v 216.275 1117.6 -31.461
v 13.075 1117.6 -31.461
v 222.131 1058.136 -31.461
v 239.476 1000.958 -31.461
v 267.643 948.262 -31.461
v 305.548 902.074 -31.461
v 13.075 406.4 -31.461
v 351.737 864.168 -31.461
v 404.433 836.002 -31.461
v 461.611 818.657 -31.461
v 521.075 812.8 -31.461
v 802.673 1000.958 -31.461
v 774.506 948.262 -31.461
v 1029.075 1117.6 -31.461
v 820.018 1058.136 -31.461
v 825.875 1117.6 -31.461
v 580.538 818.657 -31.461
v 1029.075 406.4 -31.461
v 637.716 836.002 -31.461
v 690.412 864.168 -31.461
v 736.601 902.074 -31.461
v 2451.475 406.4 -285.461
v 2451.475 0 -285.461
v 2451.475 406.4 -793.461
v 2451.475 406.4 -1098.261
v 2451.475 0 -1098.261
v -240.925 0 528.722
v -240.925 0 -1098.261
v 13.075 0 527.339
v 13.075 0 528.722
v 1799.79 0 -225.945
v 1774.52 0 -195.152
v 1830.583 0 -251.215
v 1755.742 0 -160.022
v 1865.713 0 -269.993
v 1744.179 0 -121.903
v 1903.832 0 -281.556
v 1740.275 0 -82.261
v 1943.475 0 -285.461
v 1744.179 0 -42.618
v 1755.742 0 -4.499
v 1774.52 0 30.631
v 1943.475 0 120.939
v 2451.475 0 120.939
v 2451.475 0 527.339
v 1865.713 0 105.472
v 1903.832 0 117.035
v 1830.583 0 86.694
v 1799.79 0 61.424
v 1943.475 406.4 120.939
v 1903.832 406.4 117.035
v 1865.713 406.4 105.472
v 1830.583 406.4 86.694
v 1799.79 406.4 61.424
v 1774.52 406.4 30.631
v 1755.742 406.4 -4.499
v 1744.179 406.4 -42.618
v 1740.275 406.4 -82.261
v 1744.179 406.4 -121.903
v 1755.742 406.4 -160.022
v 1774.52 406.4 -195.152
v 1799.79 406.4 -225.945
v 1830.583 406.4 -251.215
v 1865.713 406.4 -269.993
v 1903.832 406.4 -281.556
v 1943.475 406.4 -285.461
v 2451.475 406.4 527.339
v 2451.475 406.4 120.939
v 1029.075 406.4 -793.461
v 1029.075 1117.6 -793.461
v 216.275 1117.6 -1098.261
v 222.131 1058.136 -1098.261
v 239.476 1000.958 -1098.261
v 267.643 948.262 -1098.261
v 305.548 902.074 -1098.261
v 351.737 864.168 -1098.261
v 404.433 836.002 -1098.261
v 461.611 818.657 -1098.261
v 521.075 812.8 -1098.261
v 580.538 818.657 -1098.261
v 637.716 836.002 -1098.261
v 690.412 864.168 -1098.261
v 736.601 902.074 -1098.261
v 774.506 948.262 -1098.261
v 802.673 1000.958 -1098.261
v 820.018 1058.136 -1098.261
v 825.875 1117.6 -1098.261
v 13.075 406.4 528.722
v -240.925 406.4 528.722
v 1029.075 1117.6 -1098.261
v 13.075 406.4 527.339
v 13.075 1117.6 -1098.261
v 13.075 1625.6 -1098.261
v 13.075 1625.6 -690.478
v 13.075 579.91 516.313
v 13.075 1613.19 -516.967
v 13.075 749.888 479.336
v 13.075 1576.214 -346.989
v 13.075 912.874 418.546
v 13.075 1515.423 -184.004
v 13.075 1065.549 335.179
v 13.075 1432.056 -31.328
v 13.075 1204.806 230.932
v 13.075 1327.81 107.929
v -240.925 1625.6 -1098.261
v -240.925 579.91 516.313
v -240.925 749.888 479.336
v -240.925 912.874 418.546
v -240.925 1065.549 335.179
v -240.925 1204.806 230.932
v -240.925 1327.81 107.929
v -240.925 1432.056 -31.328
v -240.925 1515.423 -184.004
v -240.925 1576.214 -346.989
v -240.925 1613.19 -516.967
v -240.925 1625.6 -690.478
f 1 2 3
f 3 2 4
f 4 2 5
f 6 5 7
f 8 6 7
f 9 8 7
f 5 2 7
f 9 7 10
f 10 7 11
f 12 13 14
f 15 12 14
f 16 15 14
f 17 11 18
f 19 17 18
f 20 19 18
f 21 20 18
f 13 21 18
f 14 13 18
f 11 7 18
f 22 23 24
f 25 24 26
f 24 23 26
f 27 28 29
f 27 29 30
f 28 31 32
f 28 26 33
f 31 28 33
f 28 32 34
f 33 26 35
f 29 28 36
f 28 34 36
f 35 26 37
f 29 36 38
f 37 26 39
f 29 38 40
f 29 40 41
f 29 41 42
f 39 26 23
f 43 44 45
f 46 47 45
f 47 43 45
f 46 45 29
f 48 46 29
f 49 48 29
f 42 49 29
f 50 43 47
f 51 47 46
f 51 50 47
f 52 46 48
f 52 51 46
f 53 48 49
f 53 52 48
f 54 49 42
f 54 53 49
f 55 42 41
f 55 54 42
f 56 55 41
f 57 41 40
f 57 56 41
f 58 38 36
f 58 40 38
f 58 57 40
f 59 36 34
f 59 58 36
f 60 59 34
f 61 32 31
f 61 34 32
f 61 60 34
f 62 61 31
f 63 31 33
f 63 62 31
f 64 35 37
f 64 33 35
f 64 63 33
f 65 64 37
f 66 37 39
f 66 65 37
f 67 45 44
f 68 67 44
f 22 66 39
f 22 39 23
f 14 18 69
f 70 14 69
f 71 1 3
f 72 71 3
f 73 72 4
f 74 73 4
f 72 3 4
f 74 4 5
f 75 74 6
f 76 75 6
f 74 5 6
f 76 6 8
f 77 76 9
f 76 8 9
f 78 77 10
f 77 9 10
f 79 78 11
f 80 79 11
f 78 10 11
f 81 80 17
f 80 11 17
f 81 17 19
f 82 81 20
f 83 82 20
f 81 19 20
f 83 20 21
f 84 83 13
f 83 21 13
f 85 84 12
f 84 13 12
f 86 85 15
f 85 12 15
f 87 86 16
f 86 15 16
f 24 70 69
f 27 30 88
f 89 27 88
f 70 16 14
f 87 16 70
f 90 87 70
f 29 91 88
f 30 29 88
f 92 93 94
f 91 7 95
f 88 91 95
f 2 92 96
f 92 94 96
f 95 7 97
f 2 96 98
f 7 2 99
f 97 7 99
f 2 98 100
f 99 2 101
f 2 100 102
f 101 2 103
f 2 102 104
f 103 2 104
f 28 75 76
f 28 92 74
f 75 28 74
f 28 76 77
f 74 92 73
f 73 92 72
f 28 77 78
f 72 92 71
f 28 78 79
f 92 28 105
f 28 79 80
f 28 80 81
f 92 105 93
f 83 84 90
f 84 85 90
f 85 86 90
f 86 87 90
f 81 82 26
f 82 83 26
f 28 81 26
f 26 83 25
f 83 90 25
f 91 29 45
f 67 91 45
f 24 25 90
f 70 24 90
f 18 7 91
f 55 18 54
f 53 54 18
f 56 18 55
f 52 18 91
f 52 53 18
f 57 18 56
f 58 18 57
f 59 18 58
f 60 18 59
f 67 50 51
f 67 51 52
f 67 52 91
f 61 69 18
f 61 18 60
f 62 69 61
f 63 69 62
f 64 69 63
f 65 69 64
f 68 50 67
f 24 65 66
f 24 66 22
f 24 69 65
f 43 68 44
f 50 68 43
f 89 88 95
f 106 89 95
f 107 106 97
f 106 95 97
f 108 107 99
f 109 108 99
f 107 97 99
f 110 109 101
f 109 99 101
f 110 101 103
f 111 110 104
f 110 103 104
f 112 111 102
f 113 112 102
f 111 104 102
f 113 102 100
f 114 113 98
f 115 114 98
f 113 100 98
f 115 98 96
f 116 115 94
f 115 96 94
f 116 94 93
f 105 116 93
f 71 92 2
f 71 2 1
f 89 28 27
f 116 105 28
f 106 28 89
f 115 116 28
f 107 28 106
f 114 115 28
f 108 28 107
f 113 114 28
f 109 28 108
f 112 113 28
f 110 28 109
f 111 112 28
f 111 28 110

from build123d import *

# Parameters (mm, degrees)
SKETCH2_W           = 2438.4
SKETCH2_H           = 1625.6
BOSS_EXTRUDE1_DEPTH = 406.4
CUT_EXTRUDE1_DEPTH  = 2717.81148747
BOSS_EXTRUDE3_DEPTH = 254
SKETCH8_W           = 1016
SKETCH8_H           = 1066.8
BOSS_EXTRUDE4_DEPTH = 711.2
SKETCH9_R           = 304.8
CUT_EXTRUDE3_DEPTH  = 3129.955892197
BOSS_EXTRUDE6_DEPTH = 304.8


with BuildPart() as part:
    # Sketch2 → Boss-Extrude1 (new body)
    with BuildSketch(Plane(origin=(0, 0, 0), x_dir=(1, 0, 0), z_dir=(0, 1, 0))):
        with Locations((1232.274530831, 285.460589812)):
            Rectangle(SKETCH2_W, SKETCH2_H)
    extrude(amount=BOSS_EXTRUDE1_DEPTH)

    # Sketch4 → Cut-Extrude1 (cut, through all)
    with BuildSketch(Plane(origin=(0, 406.4, 0), x_dir=(1, 0, 0), z_dir=(0, 1, 0))):
        with BuildLine():
            Line((2451.474530831, -120.939410188), (1943.474530831, -120.939410188))
            ThreePointArc((1943.474530831, -120.939410188), (1740.274530831, 82.260589812), (1943.474530831, 285.460589812))
            Line((1943.474530831, 285.460589812), (2451.474530831, 285.460589812))
            ThreePointArc((2451.474530831, 285.460589812), (2654.674530831, 82.260589812), (2451.474530831, -120.939410188))
        make_face()
    extrude(amount=-CUT_EXTRUDE1_DEPTH, mode=Mode.SUBTRACT)

    # Sketch6 → Boss-Extrude3 (add)
    with BuildSketch(Plane.ZY.offset(-13.074530831)):
        with BuildLine():
            Line((-1098.260589812, 0), (528.72241694, 0))
            Line((528.72241694, 0), (528.72241694, 406.4))
            ThreePointArc((528.72241694, 406.4), (171.627004563, 1268.504587623), (-690.47758306, 1625.6))
            Line((-690.47758306, 1625.6), (-1098.260589812, 1625.6))
            Line((-1098.260589812, 1625.6), (-1098.260589812, 0))
        make_face()
    extrude(amount=BOSS_EXTRUDE3_DEPTH)

    # Sketch8 → Boss-Extrude4 (add)
    with BuildSketch(Plane(origin=(0, 406.4, 0), x_dir=(1, 0, 0), z_dir=(0, 1, 0))):
        with Locations((521.074530831, 564.860589812)):
            Rectangle(SKETCH8_W, SKETCH8_H)
    extrude(amount=BOSS_EXTRUDE4_DEPTH)

    # Sketch9 → Cut-Extrude3 (cut, through all)
    with BuildSketch(Plane.XY.offset(-31.460589812)):
        with Locations((521.074530831, 1117.6)):
            Circle(SKETCH9_R)
    extrude(amount=-CUT_EXTRUDE3_DEPTH, mode=Mode.SUBTRACT)

    # Sketch12 → Boss-Extrude6 (add)
    with BuildSketch(Plane(origin=(0, 0, -1098.260589812), x_dir=(-1, 0, 0), z_dir=(0, 0, -1))):
        Polygon((-2451.474530831, 406.4), (-1029.074530831, 1117.6), (-1029.074530831, 406.4), align=None)
    extrude(amount=-BOSS_EXTRUDE6_DEPTH)


solid = part.part
